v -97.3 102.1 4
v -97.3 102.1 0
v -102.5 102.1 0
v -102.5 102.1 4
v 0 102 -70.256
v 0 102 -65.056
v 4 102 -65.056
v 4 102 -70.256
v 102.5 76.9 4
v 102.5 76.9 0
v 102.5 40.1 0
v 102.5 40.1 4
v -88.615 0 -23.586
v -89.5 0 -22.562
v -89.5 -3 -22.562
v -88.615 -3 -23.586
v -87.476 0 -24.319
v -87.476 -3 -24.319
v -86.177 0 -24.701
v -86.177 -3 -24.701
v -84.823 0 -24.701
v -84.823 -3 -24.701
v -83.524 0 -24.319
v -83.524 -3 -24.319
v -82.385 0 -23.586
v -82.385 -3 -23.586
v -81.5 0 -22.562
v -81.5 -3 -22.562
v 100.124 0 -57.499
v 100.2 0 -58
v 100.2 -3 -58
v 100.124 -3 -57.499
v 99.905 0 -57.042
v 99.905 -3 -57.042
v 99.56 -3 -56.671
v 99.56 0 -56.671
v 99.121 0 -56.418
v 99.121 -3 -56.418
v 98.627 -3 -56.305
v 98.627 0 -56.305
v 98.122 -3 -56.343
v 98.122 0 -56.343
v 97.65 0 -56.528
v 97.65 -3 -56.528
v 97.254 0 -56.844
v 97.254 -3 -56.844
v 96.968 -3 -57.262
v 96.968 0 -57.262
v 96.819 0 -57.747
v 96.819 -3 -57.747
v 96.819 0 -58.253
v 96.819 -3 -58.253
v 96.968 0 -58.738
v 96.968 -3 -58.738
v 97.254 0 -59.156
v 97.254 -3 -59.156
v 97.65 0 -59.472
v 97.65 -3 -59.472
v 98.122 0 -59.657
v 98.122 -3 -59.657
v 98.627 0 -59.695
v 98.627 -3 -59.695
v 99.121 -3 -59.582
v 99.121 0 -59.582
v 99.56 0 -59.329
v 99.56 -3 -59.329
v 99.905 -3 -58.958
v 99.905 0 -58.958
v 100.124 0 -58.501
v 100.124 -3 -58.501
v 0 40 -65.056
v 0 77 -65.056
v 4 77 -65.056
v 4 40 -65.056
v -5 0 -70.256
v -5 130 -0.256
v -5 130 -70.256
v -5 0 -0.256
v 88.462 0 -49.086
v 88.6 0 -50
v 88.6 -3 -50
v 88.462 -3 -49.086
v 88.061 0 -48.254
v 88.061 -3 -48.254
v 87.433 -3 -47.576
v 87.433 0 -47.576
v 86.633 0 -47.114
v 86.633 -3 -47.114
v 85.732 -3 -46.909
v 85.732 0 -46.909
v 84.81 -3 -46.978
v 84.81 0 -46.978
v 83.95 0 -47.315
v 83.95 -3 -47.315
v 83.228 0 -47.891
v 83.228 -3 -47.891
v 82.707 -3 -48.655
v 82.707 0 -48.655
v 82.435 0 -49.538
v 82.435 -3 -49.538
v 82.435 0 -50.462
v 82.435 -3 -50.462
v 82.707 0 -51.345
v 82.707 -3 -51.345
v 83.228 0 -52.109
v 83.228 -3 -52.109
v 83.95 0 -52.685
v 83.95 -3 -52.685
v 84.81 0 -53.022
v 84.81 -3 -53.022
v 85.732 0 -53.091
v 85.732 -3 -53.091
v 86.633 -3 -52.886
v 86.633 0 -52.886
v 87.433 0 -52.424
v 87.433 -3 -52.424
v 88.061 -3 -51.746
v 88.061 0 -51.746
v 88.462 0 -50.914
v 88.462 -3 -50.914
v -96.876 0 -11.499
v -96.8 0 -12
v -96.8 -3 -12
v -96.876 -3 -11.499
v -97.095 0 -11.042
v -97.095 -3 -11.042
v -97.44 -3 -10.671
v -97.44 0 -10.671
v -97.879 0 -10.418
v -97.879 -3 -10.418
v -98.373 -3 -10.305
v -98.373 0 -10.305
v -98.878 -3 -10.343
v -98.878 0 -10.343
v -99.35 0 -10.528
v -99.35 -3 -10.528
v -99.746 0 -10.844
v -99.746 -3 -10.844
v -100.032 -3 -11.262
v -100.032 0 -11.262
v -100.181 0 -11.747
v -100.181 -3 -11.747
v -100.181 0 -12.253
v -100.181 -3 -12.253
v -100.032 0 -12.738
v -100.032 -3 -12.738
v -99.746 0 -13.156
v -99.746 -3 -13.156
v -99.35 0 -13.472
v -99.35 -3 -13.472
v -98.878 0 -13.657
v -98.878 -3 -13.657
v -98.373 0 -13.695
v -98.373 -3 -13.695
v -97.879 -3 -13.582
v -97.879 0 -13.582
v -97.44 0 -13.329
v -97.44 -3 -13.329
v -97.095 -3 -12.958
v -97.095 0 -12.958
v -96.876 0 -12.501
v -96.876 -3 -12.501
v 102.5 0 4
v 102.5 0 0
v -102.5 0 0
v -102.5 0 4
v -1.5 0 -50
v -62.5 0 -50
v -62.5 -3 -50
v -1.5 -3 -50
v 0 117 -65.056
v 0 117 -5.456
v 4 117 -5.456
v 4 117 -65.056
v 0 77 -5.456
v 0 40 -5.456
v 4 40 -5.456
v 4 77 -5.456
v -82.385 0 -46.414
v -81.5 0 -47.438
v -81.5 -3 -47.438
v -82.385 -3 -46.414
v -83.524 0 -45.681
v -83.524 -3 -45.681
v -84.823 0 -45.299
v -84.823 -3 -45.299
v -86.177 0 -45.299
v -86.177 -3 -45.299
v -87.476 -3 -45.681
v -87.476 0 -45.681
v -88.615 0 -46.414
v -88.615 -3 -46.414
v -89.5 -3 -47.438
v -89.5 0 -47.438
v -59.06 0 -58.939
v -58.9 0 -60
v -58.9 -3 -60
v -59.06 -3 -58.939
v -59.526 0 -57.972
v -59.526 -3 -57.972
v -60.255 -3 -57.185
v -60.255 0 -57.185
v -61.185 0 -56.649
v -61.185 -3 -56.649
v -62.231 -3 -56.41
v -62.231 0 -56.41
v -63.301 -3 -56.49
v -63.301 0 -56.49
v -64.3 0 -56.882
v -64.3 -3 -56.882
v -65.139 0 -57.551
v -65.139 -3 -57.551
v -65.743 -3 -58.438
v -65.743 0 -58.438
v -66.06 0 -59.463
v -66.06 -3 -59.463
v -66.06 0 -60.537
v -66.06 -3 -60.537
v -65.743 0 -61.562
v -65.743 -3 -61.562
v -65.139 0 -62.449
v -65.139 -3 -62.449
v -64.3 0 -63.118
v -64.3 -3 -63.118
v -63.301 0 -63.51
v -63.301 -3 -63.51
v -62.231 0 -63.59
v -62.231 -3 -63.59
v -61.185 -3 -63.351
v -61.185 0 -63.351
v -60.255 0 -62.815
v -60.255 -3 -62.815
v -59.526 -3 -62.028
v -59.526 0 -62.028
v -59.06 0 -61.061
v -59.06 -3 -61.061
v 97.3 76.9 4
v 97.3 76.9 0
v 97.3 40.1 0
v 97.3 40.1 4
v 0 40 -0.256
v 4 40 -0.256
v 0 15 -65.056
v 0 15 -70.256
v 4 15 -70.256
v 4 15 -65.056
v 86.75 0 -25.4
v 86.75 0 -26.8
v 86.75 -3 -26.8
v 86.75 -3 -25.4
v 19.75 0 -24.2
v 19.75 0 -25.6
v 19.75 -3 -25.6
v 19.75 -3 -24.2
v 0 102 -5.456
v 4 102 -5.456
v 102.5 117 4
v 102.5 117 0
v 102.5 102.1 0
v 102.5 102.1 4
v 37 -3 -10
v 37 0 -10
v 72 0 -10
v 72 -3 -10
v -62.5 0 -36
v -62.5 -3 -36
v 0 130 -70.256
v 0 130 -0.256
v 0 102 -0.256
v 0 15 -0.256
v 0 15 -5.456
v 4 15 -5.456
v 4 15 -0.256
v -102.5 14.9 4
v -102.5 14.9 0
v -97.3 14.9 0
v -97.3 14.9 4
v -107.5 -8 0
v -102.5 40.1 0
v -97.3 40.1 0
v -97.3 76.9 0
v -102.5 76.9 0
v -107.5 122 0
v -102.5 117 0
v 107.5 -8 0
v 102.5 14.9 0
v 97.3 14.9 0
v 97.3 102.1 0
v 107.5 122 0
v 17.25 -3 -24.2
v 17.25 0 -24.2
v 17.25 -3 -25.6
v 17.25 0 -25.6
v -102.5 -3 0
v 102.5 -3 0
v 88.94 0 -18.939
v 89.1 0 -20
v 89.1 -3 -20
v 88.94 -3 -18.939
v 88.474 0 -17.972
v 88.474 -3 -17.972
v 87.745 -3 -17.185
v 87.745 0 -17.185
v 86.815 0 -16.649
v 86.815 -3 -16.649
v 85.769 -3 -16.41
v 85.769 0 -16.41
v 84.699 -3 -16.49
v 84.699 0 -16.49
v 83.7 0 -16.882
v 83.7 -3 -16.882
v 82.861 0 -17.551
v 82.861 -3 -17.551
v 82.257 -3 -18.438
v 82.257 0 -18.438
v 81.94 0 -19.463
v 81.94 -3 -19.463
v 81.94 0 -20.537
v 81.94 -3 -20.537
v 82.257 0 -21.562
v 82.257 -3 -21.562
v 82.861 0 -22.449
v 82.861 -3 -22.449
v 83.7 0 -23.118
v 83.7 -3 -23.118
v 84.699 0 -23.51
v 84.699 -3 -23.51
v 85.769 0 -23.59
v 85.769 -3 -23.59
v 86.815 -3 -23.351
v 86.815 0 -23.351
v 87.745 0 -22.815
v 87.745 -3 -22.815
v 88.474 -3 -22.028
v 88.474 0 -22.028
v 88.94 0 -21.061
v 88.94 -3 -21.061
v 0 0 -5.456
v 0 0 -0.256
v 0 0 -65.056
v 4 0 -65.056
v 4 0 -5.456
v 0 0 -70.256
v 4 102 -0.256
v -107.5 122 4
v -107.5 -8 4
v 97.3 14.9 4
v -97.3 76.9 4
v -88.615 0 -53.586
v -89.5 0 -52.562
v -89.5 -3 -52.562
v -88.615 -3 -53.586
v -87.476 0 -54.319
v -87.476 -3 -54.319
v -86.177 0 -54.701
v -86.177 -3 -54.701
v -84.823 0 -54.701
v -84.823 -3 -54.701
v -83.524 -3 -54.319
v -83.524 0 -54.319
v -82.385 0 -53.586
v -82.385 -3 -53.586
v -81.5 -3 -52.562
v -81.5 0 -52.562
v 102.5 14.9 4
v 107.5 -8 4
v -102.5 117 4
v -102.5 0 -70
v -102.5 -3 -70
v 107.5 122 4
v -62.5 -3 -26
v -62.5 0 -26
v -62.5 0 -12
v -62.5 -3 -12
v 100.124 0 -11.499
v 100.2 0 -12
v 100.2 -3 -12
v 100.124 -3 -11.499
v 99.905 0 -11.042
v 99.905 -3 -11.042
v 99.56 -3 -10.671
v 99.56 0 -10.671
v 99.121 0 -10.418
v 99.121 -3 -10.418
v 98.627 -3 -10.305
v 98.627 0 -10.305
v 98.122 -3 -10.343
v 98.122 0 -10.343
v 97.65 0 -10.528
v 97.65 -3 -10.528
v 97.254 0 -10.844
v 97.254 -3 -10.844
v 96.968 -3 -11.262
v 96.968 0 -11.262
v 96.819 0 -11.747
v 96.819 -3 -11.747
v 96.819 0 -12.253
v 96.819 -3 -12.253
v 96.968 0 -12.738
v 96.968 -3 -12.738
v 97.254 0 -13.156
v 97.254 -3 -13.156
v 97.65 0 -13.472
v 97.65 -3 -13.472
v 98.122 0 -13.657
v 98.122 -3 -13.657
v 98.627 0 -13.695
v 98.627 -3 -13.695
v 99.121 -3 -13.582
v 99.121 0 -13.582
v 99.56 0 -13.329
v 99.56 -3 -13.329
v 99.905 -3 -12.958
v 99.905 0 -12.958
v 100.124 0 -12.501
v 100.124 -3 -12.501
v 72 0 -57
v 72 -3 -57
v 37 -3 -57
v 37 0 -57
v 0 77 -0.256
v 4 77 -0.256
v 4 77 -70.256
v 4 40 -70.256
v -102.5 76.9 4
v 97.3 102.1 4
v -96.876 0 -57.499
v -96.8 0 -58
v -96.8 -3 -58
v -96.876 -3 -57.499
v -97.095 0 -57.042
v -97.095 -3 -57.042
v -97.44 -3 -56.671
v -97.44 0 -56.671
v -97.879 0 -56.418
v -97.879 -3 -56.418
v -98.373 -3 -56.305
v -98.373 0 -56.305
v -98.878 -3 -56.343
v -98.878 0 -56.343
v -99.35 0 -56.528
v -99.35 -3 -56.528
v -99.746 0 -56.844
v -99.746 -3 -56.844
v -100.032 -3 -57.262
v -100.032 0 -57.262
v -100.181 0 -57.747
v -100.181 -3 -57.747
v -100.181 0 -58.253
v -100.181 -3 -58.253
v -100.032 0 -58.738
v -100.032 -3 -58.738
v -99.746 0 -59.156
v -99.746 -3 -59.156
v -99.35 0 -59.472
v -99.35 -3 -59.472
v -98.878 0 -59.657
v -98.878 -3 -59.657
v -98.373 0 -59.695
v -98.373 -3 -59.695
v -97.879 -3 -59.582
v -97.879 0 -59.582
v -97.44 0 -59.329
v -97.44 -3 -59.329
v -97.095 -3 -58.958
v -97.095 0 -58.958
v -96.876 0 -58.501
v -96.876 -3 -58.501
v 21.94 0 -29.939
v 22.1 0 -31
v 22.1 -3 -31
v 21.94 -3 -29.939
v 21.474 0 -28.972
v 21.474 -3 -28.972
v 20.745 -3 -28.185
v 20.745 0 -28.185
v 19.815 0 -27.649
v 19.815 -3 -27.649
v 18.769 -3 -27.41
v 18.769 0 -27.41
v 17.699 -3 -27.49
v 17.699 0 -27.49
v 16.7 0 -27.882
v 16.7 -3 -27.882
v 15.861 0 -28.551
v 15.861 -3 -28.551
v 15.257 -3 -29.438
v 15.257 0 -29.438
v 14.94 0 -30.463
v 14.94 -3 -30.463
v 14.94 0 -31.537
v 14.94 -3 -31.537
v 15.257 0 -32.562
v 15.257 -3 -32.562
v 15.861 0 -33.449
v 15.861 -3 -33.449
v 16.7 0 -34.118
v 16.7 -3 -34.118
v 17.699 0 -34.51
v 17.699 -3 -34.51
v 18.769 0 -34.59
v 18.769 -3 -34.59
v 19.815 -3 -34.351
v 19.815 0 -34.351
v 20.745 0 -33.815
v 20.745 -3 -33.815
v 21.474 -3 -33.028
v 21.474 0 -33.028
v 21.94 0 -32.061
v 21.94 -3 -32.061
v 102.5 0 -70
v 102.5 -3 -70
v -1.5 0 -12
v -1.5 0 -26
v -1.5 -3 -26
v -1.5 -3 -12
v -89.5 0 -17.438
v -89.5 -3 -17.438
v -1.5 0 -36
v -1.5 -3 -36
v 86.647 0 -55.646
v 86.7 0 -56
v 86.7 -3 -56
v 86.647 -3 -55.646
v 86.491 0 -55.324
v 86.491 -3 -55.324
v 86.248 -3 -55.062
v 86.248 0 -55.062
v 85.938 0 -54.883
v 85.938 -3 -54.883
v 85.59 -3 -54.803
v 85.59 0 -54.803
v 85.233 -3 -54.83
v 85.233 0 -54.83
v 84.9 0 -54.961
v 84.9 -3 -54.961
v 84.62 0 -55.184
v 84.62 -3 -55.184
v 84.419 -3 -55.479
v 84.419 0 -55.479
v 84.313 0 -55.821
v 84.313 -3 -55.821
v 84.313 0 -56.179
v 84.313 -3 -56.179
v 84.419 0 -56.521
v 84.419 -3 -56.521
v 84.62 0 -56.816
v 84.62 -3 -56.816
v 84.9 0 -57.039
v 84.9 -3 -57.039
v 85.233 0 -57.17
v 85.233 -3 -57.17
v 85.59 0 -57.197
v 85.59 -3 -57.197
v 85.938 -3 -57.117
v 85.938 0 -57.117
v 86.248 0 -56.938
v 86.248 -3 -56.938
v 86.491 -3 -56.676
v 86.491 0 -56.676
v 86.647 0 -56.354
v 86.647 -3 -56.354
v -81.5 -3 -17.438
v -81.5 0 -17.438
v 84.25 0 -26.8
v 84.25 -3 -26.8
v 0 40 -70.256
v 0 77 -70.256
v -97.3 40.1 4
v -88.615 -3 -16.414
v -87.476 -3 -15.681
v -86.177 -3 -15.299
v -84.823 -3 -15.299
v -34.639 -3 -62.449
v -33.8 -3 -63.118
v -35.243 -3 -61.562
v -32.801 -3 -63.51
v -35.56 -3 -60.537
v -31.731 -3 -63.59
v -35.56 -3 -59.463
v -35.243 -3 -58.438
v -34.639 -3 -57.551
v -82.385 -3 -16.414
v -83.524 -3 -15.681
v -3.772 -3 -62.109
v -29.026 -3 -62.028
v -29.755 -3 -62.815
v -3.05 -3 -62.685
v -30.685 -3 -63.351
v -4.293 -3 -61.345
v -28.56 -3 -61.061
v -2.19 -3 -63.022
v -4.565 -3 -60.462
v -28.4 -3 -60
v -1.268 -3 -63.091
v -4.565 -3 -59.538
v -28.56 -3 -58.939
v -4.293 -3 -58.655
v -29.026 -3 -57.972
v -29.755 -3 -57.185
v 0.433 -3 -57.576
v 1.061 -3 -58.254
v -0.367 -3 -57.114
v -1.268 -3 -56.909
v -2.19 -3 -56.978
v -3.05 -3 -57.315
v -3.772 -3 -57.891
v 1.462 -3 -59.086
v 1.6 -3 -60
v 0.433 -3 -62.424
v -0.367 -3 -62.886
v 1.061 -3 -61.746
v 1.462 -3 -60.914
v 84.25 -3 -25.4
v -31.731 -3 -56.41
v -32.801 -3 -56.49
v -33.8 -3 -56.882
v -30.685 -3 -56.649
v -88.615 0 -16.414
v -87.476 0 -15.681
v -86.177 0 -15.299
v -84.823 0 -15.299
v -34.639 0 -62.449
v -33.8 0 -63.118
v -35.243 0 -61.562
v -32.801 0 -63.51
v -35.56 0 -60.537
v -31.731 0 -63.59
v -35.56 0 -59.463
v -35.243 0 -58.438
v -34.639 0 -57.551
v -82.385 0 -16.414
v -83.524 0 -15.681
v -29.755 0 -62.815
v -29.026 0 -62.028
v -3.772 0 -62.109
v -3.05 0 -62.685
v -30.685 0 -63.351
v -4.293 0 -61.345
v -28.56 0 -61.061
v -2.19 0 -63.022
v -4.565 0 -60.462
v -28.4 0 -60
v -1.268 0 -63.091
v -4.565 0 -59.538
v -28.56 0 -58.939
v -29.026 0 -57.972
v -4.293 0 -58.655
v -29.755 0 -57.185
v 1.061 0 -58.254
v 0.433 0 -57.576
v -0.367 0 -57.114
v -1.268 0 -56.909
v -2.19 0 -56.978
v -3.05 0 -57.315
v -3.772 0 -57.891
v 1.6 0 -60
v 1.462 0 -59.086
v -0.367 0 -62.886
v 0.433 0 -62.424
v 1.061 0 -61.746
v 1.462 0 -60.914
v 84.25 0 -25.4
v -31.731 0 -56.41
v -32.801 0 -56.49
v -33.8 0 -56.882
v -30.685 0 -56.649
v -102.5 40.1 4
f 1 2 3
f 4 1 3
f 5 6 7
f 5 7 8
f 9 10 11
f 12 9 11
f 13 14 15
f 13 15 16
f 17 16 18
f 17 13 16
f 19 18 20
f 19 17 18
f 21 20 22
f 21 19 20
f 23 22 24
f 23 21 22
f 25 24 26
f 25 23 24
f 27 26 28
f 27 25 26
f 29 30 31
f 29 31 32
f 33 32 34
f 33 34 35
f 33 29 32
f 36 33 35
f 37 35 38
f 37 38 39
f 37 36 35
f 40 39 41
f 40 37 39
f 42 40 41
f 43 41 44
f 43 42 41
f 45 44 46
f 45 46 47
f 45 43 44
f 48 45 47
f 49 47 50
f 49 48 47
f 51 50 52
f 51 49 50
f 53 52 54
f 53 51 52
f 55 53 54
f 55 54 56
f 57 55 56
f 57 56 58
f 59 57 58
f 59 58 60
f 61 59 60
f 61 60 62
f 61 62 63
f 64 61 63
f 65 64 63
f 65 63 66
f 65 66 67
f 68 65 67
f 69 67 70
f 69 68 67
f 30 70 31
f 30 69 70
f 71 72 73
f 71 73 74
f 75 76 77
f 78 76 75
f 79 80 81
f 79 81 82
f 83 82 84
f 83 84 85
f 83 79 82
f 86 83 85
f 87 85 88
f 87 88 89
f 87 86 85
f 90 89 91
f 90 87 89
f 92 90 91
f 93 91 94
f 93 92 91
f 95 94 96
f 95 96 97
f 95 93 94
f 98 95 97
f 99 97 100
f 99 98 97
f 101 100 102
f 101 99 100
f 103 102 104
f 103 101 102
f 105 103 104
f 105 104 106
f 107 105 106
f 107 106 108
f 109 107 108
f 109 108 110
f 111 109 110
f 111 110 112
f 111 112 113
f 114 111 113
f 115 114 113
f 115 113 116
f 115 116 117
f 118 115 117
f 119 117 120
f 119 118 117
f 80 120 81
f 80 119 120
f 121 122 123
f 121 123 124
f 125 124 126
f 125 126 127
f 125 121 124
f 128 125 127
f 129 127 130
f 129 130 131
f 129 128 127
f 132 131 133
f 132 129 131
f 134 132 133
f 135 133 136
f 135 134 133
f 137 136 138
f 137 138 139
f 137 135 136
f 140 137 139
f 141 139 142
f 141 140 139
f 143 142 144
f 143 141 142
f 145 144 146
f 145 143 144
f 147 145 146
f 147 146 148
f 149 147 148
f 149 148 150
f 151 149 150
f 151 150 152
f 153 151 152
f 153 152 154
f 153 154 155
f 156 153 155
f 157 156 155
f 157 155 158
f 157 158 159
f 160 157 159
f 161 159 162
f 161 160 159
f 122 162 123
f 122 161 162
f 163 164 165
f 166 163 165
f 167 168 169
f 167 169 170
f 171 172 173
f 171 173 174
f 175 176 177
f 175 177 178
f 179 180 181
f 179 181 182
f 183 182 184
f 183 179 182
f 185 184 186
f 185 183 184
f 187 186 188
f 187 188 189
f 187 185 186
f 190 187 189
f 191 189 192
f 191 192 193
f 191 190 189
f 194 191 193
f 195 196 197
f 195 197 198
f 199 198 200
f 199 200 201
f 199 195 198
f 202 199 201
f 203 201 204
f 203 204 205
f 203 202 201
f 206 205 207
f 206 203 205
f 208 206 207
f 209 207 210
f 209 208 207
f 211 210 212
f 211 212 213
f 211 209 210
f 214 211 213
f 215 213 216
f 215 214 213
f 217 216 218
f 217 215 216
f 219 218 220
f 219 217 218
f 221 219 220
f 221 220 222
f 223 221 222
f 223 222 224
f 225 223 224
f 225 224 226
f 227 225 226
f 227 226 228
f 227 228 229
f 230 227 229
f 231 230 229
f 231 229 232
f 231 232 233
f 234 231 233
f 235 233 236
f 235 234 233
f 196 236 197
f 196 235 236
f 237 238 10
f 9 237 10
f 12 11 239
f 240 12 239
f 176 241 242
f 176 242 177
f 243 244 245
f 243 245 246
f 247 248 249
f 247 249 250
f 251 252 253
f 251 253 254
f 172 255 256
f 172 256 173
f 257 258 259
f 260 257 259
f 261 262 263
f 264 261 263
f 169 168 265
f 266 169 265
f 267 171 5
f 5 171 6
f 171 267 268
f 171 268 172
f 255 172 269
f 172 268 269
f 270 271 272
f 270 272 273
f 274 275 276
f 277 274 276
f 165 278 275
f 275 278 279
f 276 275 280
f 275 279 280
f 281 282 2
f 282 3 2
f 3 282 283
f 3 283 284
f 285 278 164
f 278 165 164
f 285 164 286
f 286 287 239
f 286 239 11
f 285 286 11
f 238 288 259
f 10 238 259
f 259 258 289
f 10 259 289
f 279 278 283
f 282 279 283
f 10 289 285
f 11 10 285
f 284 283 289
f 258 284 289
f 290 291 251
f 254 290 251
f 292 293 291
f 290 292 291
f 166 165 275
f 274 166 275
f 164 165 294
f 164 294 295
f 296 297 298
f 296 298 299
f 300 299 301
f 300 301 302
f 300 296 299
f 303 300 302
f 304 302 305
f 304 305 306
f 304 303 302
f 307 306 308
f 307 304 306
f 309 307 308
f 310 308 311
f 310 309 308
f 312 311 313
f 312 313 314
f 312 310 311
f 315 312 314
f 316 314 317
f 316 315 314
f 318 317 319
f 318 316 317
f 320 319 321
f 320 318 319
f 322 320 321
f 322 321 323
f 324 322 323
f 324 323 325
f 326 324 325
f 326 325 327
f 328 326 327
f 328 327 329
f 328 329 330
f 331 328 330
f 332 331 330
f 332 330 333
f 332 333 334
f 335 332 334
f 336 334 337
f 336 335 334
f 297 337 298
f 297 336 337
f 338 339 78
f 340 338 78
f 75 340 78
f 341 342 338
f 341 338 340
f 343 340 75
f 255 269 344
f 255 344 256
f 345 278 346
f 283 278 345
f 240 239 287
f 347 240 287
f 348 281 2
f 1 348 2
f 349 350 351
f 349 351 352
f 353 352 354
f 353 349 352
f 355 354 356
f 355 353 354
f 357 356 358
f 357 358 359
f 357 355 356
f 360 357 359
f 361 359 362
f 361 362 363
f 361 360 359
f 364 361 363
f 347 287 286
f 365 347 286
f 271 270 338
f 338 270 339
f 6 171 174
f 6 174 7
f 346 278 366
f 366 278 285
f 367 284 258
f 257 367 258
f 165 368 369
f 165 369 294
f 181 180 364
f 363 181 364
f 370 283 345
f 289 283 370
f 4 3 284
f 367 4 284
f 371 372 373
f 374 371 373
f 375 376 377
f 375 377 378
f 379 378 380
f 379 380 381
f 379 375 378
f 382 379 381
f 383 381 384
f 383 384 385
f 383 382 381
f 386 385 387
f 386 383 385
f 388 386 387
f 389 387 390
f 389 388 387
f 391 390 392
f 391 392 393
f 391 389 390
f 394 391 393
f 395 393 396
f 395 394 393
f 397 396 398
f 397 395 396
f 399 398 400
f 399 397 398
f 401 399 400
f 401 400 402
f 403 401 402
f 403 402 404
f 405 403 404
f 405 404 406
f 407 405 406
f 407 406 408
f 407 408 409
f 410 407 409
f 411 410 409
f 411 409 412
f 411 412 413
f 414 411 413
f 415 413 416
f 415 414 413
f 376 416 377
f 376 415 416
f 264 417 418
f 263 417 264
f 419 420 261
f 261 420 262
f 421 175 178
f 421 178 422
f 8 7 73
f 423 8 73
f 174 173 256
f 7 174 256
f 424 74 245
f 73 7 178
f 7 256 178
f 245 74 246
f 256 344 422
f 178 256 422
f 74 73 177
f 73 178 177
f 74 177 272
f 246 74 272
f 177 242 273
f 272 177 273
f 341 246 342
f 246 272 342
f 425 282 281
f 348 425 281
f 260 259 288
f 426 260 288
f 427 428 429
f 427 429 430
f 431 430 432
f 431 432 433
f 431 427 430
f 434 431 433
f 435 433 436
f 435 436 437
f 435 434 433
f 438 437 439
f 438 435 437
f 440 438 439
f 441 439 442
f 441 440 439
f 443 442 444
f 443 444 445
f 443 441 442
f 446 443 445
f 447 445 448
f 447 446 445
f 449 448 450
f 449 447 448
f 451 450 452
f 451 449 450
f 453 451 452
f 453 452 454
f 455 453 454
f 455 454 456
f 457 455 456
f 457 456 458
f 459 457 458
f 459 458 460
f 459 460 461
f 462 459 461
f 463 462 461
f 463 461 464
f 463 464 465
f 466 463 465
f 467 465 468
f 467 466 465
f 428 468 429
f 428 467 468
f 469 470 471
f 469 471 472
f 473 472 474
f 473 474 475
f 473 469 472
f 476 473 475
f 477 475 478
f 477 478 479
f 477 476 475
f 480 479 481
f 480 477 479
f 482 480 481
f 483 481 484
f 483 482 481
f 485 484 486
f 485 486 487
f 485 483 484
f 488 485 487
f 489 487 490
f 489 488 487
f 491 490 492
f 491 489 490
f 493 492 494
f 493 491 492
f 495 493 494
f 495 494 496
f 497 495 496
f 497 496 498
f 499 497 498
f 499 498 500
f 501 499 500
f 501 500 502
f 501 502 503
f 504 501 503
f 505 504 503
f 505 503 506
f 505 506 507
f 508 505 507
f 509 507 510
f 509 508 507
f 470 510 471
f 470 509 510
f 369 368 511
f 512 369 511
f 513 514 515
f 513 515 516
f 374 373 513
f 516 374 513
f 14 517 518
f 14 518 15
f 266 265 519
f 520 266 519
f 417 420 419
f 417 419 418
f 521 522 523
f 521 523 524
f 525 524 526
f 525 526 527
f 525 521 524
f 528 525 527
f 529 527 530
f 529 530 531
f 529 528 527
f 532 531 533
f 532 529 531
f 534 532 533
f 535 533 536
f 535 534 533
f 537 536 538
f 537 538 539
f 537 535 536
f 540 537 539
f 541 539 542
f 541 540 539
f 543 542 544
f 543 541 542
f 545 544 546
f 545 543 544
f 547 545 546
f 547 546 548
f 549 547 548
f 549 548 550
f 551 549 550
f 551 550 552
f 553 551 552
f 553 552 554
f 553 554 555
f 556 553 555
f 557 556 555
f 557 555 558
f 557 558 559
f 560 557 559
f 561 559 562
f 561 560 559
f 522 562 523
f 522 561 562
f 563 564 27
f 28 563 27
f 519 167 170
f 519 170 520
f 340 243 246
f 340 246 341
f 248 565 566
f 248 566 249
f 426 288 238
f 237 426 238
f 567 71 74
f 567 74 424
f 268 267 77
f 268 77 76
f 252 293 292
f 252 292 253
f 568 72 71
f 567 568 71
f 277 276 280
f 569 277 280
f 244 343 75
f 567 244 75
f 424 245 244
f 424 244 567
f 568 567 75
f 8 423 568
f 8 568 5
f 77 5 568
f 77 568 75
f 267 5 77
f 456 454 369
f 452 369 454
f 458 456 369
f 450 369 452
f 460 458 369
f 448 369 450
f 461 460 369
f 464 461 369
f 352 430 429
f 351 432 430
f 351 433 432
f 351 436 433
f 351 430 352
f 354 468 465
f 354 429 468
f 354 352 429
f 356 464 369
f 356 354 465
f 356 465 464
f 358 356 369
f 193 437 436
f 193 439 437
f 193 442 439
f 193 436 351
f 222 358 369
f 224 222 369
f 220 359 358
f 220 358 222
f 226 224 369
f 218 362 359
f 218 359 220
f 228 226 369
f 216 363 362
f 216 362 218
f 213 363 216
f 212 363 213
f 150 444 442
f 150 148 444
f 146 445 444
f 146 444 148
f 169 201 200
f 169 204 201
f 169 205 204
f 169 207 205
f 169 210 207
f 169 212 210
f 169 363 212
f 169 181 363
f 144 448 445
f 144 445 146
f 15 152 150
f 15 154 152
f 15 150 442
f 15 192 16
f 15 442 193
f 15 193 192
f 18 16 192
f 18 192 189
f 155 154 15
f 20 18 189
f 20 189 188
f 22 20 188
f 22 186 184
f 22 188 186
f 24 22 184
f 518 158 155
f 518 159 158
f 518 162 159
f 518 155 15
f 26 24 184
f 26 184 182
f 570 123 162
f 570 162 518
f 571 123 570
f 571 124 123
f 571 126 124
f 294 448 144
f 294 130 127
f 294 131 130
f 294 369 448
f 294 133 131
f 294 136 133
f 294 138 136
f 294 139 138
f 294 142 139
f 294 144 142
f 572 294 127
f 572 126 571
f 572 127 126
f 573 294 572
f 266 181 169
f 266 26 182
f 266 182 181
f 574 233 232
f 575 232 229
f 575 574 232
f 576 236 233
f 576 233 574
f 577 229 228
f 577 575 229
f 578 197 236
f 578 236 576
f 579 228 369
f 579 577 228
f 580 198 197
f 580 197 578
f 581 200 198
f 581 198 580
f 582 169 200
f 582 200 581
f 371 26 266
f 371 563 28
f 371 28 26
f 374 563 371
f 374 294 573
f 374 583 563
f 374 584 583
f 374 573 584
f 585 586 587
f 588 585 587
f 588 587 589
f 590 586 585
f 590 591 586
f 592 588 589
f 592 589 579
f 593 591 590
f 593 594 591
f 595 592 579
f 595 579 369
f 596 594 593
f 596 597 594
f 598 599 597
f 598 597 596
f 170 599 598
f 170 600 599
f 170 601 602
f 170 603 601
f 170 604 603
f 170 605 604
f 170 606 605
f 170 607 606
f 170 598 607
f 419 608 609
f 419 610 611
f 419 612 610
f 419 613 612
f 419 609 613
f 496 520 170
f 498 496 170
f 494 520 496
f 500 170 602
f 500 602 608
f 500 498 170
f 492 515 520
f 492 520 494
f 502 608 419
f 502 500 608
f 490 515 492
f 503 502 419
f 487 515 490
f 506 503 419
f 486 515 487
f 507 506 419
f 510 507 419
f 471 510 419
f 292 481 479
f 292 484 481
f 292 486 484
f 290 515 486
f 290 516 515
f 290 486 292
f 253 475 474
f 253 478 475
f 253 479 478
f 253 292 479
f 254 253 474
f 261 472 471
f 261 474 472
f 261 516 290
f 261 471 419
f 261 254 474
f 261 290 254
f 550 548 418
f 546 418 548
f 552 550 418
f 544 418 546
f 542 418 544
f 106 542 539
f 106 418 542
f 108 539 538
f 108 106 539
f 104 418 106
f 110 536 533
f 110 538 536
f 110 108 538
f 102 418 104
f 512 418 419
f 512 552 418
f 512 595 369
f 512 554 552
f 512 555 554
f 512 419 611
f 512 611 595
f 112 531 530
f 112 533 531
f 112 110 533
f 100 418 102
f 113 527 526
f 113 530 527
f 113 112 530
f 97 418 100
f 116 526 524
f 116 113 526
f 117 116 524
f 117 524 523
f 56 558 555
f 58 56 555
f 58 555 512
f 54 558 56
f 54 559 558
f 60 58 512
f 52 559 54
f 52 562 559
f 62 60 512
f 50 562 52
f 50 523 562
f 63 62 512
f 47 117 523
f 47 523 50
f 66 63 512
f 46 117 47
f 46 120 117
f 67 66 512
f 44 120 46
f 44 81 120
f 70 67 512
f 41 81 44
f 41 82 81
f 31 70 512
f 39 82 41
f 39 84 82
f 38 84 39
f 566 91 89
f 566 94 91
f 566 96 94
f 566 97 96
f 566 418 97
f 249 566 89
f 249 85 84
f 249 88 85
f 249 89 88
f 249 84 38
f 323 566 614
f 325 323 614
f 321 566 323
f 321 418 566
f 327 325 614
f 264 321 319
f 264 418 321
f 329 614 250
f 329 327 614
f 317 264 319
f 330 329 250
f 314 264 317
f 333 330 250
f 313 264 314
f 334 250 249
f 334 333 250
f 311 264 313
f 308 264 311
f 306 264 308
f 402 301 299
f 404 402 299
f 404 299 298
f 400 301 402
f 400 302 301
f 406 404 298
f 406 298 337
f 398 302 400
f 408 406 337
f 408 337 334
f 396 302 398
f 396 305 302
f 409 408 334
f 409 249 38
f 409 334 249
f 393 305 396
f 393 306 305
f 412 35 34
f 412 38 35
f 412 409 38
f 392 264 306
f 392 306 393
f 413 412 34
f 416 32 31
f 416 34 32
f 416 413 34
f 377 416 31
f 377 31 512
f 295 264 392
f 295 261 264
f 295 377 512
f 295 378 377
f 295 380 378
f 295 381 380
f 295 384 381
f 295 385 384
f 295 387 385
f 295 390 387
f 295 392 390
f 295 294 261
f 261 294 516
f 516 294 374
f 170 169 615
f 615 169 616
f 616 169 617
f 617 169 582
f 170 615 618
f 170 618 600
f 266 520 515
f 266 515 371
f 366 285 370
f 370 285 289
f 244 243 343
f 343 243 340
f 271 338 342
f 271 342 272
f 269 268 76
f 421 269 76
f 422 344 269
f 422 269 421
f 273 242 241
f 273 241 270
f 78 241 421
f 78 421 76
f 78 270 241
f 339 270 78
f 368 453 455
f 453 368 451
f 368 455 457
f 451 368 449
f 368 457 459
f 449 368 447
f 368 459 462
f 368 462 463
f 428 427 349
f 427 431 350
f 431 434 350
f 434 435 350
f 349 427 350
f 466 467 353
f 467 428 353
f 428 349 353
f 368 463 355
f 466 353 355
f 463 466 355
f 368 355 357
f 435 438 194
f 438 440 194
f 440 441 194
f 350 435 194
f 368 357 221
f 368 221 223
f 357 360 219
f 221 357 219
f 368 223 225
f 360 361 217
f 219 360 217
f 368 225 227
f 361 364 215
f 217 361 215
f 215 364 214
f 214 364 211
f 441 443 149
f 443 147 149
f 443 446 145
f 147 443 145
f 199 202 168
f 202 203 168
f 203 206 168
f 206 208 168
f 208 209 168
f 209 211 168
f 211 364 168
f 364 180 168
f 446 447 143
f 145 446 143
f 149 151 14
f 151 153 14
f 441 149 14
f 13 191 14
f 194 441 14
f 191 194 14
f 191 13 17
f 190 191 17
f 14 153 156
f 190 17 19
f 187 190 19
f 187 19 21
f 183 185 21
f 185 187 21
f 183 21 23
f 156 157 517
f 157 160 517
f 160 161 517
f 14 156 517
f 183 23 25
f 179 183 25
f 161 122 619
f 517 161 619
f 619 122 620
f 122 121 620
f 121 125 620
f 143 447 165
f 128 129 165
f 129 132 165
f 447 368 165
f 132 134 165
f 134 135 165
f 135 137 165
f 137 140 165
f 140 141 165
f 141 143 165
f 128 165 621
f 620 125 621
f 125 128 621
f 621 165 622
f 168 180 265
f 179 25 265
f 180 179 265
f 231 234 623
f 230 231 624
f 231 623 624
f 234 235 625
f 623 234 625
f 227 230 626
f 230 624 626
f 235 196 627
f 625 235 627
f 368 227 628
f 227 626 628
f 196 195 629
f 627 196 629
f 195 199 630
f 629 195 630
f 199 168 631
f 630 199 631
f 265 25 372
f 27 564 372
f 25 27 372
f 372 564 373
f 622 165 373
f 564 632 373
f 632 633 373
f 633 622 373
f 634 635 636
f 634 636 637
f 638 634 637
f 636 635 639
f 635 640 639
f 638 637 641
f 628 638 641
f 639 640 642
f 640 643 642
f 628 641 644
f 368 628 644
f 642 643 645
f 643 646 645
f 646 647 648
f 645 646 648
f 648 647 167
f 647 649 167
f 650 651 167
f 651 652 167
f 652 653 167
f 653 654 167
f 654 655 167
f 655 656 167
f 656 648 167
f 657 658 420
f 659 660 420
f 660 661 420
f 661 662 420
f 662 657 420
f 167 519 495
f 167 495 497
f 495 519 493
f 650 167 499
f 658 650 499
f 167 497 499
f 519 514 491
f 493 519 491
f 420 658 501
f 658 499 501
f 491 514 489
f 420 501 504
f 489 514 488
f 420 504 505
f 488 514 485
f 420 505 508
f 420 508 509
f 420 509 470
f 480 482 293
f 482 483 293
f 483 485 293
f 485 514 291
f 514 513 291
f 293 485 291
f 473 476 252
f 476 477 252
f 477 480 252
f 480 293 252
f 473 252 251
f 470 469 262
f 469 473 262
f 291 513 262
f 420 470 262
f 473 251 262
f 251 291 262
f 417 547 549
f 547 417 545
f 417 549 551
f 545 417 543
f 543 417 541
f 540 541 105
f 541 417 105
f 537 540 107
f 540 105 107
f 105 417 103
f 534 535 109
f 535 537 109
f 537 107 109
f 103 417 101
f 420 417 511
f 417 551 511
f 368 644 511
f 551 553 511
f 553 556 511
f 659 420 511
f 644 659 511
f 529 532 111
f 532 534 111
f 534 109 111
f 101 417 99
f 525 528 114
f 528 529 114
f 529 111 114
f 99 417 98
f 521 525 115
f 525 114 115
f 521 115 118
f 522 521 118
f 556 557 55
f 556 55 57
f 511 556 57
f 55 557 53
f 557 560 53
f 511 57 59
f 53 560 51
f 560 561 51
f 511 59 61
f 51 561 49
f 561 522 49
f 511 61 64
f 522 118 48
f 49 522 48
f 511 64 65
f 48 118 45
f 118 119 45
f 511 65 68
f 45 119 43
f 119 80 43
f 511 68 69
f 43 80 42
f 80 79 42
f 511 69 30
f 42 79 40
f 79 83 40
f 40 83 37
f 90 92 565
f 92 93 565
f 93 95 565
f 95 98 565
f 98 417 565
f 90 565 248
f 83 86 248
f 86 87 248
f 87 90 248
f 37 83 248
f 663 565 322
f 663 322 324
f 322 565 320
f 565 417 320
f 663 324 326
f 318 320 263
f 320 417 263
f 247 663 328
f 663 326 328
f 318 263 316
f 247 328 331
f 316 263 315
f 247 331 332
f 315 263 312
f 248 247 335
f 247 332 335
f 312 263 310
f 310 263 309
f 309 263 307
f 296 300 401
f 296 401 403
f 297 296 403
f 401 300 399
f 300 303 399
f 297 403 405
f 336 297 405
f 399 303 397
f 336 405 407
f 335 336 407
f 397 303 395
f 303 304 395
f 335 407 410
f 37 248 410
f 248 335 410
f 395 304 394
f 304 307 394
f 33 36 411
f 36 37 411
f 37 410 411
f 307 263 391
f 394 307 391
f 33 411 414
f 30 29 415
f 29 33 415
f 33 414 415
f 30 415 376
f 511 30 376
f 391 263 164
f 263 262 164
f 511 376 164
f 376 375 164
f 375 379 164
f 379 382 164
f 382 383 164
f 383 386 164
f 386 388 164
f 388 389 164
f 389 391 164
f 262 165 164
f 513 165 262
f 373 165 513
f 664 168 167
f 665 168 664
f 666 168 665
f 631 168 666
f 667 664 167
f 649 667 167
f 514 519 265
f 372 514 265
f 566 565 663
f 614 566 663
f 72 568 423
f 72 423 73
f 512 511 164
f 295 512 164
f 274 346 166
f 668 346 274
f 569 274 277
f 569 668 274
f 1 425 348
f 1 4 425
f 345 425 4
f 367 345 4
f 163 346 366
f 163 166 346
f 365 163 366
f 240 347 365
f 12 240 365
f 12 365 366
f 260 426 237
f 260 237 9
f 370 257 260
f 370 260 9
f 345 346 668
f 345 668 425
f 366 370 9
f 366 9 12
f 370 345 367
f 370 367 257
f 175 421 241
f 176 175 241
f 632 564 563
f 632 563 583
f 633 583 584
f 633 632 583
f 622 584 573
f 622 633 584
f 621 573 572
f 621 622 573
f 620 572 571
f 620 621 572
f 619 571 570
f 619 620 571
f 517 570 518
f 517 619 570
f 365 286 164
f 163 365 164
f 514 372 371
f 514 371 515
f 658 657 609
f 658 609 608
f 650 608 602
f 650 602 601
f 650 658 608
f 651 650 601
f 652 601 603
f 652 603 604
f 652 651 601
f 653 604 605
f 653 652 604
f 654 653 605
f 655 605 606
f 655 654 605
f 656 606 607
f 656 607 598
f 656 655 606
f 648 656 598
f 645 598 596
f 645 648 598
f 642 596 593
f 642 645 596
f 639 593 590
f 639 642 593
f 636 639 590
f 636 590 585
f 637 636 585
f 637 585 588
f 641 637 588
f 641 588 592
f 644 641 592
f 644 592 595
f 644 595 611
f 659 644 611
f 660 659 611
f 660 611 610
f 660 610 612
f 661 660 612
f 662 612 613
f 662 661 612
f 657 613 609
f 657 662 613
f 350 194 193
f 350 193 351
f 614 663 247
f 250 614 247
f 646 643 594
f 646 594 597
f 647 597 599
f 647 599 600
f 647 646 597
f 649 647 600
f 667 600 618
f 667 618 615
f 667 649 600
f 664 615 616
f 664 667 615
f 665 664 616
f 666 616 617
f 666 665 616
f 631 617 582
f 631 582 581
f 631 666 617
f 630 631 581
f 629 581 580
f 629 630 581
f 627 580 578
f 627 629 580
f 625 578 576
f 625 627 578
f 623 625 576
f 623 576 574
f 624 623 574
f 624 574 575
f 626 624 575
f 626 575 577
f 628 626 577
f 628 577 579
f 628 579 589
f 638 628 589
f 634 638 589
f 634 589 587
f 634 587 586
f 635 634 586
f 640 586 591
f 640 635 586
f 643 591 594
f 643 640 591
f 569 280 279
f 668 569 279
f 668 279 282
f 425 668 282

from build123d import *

# Parameters (mm, degrees)
SKETCH008_W   = 205
SKETCH008_H   = 70
SKETCH008_R   = 3.6
SKETCH008_R_2 = 3.1
SKETCH008_R_3 = 1.2
SKETCH008_R_4 = 1.7
SKETCH008_W_2 = 61
SKETCH008_H_2 = 14
SKETCH008_W_3 = 2.5
SKETCH008_H_3 = 1.4
SKETCH008_W_4 = 35
SKETCH008_H_4 = 47
PAD_DEPTH     = 3
SKETCH009_W   = 215
SKETCH009_H   = 130
PAD001_DEPTH  = 4
PAD002_DEPTH  = 4
PAD003_DEPTH  = 5


with BuildPart() as pannellofrontale:
    # Sketch008 → Pad (new body)
    with BuildSketch(Plane.XZ):
        with Locations((0, -35)):
            Rectangle(SKETCH008_W, SKETCH008_H)
        with Locations((85.5, -20)):
            Circle(SKETCH008_R, mode=Mode.SUBTRACT)
        with Locations((18.5, -31)):
            Circle(SKETCH008_R, mode=Mode.SUBTRACT)
        with Locations((85.5, -50)):
            Circle(SKETCH008_R_2, mode=Mode.SUBTRACT)
        with Locations((85.5, -56)):
            Circle(SKETCH008_R_3, mode=Mode.SUBTRACT)
        with Locations((-62.5, -60)):
            Circle(SKETCH008_R, mode=Mode.SUBTRACT)
        with Locations((-32, -60)):
            Circle(SKETCH008_R, mode=Mode.SUBTRACT)
        with Locations((-1.5, -60)):
            Circle(SKETCH008_R_2, mode=Mode.SUBTRACT)
        with Locations((-98.5, -12)):
            Circle(SKETCH008_R_4, mode=Mode.SUBTRACT)
        with Locations((-98.5, -58)):
            Circle(SKETCH008_R_4, mode=Mode.SUBTRACT)
        with Locations((98.5, -12)):
            Circle(SKETCH008_R_4, mode=Mode.SUBTRACT)
        with Locations((98.5, -58)):
            Circle(SKETCH008_R_4, mode=Mode.SUBTRACT)
        with Locations((-32, -19)):
            Rectangle(SKETCH008_W_2, SKETCH008_H_2, mode=Mode.SUBTRACT)
        with Locations((-32, -43)):
            Rectangle(SKETCH008_W_2, SKETCH008_H_2, mode=Mode.SUBTRACT)
        with Locations((85.5, -26.1)):
            Rectangle(SKETCH008_W_3, SKETCH008_H_3, mode=Mode.SUBTRACT)
        with Locations((54.5, -33.5)):
            Rectangle(SKETCH008_W_4, SKETCH008_H_4, mode=Mode.SUBTRACT)
        with Locations((18.5, -24.9)):
            Rectangle(SKETCH008_W_3, SKETCH008_H_3, mode=Mode.SUBTRACT)
        with BuildLine():
            Line((-89.5, -17.438262), (-89.5, -22.561738))
            ThreePointArc((-89.5, -22.561738), (-85.5, -24.75), (-81.5, -22.561738))
            Line((-81.5, -17.438262), (-81.5, -22.561738))
            ThreePointArc((-81.5, -17.438262), (-85.5, -15.25), (-89.5, -17.438262))
        make_face(mode=Mode.SUBTRACT)
        with BuildLine():
            Line((-89.5, -47.438262), (-89.5, -52.561738))
            ThreePointArc((-89.5, -52.561738), (-85.5, -54.75), (-81.5, -52.561738))
            Line((-81.5, -47.438262), (-81.5, -52.561738))
            ThreePointArc((-81.5, -47.438262), (-85.5, -45.25), (-89.5, -47.438262))
        make_face(mode=Mode.SUBTRACT)
    extrude(amount=PAD_DEPTH)


with BuildPart() as mantello001:
    # Sketch009 → Pad001 (new body)
    with BuildSketch(Plane.XY):
        with Locations((0, 57)):
            Rectangle(SKETCH009_W, SKETCH009_H)
        Polygon((-102.5, 117), (102.5, 117), (102.5, 102.1), (97.3, 102.1), (97.3, 76.9), (102.5, 76.9), (102.5, 40.1), (97.3, 40.1), (97.3, 14.9), (102.5, 14.9), (102.5, 0), (-102.5, 0), (-102.5, 14.9), (-97.3, 14.9), (-97.3, 40.1), (-102.5, 40.1), (-102.5, 76.9), (-97.3, 76.9), (-97.3, 102.1), (-102.5, 102.1), align=None, mode=Mode.SUBTRACT)
    extrude(amount=PAD001_DEPTH)


with BuildPart() as spalle001:
    # Sketch010 → Pad002 (new body)
    with BuildSketch(Plane.YZ):
        Polygon((15, -0.255779), (40, -0.255779), (40, -5.455779), (77, -5.455779), (77, -0.255779), (102, -0.255779), (102, -5.455779), (117, -5.455779), (117, -65.055779), (102, -65.055779), (102, -70.255779), (77, -70.255779), (77, -65.055779), (40, -65.055779), (40, -70.255779), (15, -70.255779), (15, -65.055779), (0, -65.055779), (0, -5.455779), (15, -5.455779), align=None)
    extrude(amount=PAD002_DEPTH)

    # Sketch011 → Pad003 (join)
    with BuildSketch(Plane.YZ):
        Polygon((15, -0.255779), (40, -0.255779), (90, -0.255779), (115, -0.255779), (130, -0.255779), (130, -5.455779), (130, -65.055779), (130, -70.255779), (115, -70.255779), (90, -70.255779), (40, -70.255779), (15, -70.255779), (0, -70.255779), (0, -65.055779), (0, -5.455779), (0, -0.255779), align=None)
    extrude(amount=-PAD003_DEPTH)


solid = Compound([pannellofrontale.part, mantello001.part, spalle001.part])
